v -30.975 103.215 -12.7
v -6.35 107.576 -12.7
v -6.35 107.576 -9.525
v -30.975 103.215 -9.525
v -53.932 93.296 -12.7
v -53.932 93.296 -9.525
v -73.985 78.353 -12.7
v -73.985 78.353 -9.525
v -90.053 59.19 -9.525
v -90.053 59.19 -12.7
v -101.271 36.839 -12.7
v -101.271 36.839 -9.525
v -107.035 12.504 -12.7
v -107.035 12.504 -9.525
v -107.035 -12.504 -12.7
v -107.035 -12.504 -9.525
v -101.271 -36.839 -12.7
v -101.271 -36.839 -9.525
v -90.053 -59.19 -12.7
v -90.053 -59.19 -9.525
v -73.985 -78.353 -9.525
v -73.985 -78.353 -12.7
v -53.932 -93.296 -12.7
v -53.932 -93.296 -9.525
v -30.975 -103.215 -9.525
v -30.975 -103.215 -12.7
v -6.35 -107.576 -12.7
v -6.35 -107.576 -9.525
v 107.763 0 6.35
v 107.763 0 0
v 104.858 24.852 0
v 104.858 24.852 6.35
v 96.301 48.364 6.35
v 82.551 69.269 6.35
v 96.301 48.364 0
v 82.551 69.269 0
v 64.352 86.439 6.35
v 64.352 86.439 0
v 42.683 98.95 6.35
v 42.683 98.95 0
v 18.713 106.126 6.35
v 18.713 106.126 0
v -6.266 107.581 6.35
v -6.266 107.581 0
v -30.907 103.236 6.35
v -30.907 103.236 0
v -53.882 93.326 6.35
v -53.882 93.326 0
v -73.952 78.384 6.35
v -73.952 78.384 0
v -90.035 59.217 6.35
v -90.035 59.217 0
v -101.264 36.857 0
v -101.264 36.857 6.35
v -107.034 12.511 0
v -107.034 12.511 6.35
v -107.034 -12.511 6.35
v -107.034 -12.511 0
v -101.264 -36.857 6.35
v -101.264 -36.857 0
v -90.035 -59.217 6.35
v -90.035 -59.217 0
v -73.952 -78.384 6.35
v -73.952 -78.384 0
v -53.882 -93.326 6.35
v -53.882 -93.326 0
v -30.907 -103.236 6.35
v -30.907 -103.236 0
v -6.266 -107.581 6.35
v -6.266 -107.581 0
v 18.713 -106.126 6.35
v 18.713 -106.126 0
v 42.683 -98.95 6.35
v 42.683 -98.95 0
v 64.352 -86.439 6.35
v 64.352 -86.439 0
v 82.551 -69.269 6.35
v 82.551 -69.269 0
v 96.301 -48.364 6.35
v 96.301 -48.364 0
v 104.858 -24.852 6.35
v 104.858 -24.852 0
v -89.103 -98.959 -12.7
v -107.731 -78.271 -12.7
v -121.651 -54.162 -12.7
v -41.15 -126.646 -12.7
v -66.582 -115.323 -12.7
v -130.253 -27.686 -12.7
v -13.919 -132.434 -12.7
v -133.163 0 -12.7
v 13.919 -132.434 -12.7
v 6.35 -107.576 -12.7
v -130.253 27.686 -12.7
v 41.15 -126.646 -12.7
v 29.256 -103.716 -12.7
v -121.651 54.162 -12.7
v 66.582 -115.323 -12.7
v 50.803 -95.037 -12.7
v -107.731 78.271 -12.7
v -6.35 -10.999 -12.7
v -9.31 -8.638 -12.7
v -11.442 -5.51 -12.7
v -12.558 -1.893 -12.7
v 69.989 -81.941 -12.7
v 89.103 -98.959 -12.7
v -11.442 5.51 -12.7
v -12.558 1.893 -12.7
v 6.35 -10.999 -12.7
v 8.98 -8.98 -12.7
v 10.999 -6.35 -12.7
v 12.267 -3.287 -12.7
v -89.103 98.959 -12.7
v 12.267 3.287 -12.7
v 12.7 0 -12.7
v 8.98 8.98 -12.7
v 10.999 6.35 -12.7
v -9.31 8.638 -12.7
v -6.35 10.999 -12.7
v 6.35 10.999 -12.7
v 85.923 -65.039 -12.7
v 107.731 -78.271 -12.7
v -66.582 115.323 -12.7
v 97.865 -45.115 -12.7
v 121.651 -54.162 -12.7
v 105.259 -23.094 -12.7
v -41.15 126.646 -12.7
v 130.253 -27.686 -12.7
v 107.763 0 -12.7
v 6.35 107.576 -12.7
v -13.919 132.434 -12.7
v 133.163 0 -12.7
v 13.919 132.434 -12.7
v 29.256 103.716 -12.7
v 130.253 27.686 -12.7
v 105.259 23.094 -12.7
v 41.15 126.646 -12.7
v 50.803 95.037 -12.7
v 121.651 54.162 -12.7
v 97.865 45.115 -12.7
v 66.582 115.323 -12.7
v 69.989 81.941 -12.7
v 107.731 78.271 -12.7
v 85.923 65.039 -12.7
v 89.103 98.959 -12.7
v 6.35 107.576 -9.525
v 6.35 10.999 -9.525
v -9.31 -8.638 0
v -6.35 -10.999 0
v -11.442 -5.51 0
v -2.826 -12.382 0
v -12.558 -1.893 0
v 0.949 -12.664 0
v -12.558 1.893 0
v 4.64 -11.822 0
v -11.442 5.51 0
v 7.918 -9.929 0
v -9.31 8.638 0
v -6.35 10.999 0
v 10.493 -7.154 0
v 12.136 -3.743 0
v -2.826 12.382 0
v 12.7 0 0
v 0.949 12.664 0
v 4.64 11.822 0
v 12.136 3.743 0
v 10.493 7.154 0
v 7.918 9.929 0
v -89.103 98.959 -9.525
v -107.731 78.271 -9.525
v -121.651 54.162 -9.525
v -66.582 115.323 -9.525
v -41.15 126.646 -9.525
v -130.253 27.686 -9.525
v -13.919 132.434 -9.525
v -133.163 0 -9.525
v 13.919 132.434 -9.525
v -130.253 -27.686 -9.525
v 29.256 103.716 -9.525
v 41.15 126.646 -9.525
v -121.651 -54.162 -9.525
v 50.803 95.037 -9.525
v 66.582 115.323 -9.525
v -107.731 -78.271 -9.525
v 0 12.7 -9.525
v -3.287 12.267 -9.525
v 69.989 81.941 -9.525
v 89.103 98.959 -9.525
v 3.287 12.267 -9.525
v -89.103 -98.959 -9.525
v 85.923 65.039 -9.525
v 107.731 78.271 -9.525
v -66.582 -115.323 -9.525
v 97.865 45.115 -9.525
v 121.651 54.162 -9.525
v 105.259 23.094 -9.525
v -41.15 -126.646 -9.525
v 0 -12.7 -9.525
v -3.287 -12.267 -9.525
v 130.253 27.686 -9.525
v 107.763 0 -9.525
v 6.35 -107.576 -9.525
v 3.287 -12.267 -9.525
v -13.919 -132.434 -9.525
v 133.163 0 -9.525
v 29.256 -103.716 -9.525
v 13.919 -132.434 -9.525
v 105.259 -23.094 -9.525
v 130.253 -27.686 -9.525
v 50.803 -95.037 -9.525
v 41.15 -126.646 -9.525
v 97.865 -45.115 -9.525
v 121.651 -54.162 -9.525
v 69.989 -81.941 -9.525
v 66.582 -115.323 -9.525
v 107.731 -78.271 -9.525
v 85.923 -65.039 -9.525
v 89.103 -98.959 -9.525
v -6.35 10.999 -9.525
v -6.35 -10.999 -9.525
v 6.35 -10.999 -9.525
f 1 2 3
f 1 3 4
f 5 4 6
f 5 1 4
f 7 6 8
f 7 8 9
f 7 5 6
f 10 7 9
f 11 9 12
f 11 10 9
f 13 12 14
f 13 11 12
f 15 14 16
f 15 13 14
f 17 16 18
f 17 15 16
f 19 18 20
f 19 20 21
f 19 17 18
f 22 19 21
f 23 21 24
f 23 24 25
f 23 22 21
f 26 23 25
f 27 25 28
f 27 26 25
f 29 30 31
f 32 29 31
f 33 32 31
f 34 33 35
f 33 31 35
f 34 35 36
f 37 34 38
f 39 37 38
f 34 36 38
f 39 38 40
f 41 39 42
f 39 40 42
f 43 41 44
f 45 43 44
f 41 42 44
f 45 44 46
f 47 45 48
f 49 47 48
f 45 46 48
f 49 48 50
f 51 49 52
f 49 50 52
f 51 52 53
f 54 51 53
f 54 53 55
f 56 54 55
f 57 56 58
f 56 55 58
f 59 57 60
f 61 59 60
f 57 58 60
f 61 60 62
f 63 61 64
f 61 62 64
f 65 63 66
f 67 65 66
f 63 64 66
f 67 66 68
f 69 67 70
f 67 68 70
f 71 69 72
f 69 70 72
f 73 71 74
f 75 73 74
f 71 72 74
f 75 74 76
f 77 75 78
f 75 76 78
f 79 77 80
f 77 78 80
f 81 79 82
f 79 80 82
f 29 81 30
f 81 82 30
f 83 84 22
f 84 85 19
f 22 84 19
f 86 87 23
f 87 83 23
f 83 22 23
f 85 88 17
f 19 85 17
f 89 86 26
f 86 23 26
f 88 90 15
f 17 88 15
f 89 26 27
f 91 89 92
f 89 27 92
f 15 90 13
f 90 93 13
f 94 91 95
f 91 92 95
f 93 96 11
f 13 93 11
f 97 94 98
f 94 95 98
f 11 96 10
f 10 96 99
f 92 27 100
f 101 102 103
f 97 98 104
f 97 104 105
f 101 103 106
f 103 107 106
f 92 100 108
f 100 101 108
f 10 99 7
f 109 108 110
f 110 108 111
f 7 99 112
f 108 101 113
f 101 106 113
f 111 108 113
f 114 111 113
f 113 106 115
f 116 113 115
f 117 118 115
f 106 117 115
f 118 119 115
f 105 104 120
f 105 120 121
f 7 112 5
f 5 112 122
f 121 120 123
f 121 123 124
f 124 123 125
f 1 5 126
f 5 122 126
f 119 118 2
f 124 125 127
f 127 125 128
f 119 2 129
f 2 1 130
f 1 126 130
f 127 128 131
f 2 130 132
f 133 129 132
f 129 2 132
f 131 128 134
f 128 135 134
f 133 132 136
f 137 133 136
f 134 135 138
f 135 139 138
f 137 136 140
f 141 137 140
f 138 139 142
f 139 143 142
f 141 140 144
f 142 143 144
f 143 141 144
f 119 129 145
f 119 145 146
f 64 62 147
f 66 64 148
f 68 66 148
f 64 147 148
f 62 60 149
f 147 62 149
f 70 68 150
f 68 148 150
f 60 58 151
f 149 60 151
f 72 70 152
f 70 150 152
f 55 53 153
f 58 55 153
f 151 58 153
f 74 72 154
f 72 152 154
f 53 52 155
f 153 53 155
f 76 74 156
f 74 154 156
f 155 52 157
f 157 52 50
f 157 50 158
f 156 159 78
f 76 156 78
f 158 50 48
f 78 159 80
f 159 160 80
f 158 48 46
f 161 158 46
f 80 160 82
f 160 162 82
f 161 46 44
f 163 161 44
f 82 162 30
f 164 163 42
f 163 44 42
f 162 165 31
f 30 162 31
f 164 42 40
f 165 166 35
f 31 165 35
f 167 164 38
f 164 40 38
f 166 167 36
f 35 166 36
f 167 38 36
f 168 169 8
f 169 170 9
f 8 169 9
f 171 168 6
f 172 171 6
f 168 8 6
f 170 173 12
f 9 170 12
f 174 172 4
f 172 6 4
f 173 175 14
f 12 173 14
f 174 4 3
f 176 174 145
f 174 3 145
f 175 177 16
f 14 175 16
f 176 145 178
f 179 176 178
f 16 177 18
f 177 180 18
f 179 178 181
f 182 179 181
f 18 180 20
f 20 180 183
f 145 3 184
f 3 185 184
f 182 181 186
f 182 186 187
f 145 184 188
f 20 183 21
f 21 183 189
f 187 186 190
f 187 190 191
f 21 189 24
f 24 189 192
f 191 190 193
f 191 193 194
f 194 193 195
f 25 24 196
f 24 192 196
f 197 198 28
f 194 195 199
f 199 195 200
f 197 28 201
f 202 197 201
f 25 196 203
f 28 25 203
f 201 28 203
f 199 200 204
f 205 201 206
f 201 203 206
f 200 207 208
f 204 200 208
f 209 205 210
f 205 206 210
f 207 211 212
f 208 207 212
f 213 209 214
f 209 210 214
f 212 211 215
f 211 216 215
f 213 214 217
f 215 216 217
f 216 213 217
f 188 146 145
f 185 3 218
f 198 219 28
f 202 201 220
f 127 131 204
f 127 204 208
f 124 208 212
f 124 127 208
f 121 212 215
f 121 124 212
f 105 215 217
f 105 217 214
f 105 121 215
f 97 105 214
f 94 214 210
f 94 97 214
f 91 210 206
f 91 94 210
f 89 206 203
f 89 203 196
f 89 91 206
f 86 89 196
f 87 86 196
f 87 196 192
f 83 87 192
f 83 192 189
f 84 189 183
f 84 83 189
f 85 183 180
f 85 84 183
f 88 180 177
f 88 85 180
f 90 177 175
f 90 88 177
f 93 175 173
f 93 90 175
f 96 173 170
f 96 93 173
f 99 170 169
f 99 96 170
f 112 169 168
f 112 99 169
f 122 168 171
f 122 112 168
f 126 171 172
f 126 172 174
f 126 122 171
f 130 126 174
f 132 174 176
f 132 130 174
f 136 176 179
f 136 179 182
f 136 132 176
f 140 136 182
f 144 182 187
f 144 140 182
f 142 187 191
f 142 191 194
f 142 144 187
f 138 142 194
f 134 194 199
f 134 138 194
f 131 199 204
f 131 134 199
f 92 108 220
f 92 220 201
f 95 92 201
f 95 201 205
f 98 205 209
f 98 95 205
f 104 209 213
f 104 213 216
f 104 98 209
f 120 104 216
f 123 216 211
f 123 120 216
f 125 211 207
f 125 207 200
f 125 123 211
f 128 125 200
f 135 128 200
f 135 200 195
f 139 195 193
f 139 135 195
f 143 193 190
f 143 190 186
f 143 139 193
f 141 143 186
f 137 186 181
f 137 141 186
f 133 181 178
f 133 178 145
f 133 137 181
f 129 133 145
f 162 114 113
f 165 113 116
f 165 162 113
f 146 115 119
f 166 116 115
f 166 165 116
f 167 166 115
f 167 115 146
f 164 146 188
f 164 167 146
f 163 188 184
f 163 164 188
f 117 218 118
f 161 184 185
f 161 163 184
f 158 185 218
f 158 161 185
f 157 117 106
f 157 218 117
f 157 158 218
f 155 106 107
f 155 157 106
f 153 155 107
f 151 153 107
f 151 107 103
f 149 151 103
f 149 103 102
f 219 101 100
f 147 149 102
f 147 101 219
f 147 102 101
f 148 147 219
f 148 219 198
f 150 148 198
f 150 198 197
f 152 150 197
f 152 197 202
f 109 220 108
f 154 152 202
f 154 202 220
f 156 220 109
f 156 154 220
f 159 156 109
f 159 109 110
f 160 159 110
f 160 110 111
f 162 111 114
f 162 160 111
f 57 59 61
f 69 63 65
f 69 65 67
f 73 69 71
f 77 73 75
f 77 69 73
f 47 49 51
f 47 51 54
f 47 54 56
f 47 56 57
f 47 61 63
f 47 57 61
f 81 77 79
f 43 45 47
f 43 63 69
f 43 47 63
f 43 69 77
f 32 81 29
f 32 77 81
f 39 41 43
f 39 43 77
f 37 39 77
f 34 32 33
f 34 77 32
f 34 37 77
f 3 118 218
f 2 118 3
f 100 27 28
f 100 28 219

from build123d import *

# Parameters (mm, degrees)
F0_R     = 107.7630734498
F0_R_2   = 12.7
F1_DEPTH = 6.35
F2_DEPTH = 12.7
F3_R     = 133.1630796194
F4_DEPTH = 3.175


with BuildPart() as f1:
    # F0 (on Top) → F1 (new body)
    with BuildSketch(Plane.XY):
        Circle(F0_R)
        Circle(F0_R_2, mode=Mode.SUBTRACT)
        Circle(F0_R_2)
    extrude(amount=F1_DEPTH)

    # F0 (on Top) → F2 (join)
    with BuildSketch(Plane.XY):
        Circle(F0_R_2)
    extrude(amount=-F2_DEPTH)

    # F3 (on face) → F4 (join)
    with BuildSketch(Plane(origin=(0, 0, -12.7), x_dir=(1, 0, 0), z_dir=(0, 0, -1))):
        Circle(F3_R)
        with BuildLine():
            ThreePointArc((6.35, 107.5758220947), (78.4129310629, 73.9208511955), (107.7630734498, 0))
            ThreePointArc((107.7630734498, 0), (78.4129310629, -73.9208511955), (6.35, -107.5758220947))
            Line((6.35, -107.5758220947), (6.35, -123.9275708795))
            Line((6.35, -123.9275708795), (-6.35, -123.9275708795))
            Line((-6.35, -123.9275708795), (-6.35, -107.5758220947))
            ThreePointArc((-6.35, -107.5758220947), (-107.7630734498, 0), (-6.35, 107.5758220947))
            Line((-6.35, 107.5758220947), (-6.35, 123.9275708795))
            Line((-6.35, 123.9275708795), (6.35, 123.9275708795))
            Line((6.35, 123.9275708795), (6.35, 107.5758220947))
        make_face(mode=Mode.SUBTRACT)
        with BuildLine():
            ThreePointArc((-6.35, -107.5758220947), (0, -107.7630734498), (6.35, -107.5758220947))
            Line((6.35, -107.5758220947), (6.35, -10.9985226281))
            ThreePointArc((6.35, -10.9985226281), (0, -12.7), (-6.35, -10.9985226281))
            Line((-6.35, -10.9985226281), (-6.35, -107.5758220947))
        make_face()
        with BuildLine():
            Line((6.35, 10.9985226281), (6.35, 107.5758220947))
            ThreePointArc((6.35, 107.5758220947), (0, 107.7630734498), (-6.35, 107.5758220947))
            Line((-6.35, 107.5758220947), (-6.35, 10.9985226281))
            ThreePointArc((-6.35, 10.9985226281), (0, 12.7), (6.35, 10.9985226281))
        make_face()
        with BuildLine():
            Line((6.35, -123.9275708795), (6.35, -107.5758220947))
            ThreePointArc((6.35, -107.5758220947), (0, -107.7630734498), (-6.35, -107.5758220947))
            Line((-6.35, -107.5758220947), (-6.35, -123.9275708795))
            Line((-6.35, -123.9275708795), (6.35, -123.9275708795))
        make_face()
        with BuildLine():
            ThreePointArc((-6.35, 107.5758220947), (0, 107.7630734498), (6.35, 107.5758220947))
            Line((6.35, 107.5758220947), (6.35, 123.9275708795))
            Line((6.35, 123.9275708795), (-6.35, 123.9275708795))
            Line((-6.35, 123.9275708795), (-6.35, 107.5758220947))
        make_face()
    extrude(amount=-F4_DEPTH)


solid = f1.part
